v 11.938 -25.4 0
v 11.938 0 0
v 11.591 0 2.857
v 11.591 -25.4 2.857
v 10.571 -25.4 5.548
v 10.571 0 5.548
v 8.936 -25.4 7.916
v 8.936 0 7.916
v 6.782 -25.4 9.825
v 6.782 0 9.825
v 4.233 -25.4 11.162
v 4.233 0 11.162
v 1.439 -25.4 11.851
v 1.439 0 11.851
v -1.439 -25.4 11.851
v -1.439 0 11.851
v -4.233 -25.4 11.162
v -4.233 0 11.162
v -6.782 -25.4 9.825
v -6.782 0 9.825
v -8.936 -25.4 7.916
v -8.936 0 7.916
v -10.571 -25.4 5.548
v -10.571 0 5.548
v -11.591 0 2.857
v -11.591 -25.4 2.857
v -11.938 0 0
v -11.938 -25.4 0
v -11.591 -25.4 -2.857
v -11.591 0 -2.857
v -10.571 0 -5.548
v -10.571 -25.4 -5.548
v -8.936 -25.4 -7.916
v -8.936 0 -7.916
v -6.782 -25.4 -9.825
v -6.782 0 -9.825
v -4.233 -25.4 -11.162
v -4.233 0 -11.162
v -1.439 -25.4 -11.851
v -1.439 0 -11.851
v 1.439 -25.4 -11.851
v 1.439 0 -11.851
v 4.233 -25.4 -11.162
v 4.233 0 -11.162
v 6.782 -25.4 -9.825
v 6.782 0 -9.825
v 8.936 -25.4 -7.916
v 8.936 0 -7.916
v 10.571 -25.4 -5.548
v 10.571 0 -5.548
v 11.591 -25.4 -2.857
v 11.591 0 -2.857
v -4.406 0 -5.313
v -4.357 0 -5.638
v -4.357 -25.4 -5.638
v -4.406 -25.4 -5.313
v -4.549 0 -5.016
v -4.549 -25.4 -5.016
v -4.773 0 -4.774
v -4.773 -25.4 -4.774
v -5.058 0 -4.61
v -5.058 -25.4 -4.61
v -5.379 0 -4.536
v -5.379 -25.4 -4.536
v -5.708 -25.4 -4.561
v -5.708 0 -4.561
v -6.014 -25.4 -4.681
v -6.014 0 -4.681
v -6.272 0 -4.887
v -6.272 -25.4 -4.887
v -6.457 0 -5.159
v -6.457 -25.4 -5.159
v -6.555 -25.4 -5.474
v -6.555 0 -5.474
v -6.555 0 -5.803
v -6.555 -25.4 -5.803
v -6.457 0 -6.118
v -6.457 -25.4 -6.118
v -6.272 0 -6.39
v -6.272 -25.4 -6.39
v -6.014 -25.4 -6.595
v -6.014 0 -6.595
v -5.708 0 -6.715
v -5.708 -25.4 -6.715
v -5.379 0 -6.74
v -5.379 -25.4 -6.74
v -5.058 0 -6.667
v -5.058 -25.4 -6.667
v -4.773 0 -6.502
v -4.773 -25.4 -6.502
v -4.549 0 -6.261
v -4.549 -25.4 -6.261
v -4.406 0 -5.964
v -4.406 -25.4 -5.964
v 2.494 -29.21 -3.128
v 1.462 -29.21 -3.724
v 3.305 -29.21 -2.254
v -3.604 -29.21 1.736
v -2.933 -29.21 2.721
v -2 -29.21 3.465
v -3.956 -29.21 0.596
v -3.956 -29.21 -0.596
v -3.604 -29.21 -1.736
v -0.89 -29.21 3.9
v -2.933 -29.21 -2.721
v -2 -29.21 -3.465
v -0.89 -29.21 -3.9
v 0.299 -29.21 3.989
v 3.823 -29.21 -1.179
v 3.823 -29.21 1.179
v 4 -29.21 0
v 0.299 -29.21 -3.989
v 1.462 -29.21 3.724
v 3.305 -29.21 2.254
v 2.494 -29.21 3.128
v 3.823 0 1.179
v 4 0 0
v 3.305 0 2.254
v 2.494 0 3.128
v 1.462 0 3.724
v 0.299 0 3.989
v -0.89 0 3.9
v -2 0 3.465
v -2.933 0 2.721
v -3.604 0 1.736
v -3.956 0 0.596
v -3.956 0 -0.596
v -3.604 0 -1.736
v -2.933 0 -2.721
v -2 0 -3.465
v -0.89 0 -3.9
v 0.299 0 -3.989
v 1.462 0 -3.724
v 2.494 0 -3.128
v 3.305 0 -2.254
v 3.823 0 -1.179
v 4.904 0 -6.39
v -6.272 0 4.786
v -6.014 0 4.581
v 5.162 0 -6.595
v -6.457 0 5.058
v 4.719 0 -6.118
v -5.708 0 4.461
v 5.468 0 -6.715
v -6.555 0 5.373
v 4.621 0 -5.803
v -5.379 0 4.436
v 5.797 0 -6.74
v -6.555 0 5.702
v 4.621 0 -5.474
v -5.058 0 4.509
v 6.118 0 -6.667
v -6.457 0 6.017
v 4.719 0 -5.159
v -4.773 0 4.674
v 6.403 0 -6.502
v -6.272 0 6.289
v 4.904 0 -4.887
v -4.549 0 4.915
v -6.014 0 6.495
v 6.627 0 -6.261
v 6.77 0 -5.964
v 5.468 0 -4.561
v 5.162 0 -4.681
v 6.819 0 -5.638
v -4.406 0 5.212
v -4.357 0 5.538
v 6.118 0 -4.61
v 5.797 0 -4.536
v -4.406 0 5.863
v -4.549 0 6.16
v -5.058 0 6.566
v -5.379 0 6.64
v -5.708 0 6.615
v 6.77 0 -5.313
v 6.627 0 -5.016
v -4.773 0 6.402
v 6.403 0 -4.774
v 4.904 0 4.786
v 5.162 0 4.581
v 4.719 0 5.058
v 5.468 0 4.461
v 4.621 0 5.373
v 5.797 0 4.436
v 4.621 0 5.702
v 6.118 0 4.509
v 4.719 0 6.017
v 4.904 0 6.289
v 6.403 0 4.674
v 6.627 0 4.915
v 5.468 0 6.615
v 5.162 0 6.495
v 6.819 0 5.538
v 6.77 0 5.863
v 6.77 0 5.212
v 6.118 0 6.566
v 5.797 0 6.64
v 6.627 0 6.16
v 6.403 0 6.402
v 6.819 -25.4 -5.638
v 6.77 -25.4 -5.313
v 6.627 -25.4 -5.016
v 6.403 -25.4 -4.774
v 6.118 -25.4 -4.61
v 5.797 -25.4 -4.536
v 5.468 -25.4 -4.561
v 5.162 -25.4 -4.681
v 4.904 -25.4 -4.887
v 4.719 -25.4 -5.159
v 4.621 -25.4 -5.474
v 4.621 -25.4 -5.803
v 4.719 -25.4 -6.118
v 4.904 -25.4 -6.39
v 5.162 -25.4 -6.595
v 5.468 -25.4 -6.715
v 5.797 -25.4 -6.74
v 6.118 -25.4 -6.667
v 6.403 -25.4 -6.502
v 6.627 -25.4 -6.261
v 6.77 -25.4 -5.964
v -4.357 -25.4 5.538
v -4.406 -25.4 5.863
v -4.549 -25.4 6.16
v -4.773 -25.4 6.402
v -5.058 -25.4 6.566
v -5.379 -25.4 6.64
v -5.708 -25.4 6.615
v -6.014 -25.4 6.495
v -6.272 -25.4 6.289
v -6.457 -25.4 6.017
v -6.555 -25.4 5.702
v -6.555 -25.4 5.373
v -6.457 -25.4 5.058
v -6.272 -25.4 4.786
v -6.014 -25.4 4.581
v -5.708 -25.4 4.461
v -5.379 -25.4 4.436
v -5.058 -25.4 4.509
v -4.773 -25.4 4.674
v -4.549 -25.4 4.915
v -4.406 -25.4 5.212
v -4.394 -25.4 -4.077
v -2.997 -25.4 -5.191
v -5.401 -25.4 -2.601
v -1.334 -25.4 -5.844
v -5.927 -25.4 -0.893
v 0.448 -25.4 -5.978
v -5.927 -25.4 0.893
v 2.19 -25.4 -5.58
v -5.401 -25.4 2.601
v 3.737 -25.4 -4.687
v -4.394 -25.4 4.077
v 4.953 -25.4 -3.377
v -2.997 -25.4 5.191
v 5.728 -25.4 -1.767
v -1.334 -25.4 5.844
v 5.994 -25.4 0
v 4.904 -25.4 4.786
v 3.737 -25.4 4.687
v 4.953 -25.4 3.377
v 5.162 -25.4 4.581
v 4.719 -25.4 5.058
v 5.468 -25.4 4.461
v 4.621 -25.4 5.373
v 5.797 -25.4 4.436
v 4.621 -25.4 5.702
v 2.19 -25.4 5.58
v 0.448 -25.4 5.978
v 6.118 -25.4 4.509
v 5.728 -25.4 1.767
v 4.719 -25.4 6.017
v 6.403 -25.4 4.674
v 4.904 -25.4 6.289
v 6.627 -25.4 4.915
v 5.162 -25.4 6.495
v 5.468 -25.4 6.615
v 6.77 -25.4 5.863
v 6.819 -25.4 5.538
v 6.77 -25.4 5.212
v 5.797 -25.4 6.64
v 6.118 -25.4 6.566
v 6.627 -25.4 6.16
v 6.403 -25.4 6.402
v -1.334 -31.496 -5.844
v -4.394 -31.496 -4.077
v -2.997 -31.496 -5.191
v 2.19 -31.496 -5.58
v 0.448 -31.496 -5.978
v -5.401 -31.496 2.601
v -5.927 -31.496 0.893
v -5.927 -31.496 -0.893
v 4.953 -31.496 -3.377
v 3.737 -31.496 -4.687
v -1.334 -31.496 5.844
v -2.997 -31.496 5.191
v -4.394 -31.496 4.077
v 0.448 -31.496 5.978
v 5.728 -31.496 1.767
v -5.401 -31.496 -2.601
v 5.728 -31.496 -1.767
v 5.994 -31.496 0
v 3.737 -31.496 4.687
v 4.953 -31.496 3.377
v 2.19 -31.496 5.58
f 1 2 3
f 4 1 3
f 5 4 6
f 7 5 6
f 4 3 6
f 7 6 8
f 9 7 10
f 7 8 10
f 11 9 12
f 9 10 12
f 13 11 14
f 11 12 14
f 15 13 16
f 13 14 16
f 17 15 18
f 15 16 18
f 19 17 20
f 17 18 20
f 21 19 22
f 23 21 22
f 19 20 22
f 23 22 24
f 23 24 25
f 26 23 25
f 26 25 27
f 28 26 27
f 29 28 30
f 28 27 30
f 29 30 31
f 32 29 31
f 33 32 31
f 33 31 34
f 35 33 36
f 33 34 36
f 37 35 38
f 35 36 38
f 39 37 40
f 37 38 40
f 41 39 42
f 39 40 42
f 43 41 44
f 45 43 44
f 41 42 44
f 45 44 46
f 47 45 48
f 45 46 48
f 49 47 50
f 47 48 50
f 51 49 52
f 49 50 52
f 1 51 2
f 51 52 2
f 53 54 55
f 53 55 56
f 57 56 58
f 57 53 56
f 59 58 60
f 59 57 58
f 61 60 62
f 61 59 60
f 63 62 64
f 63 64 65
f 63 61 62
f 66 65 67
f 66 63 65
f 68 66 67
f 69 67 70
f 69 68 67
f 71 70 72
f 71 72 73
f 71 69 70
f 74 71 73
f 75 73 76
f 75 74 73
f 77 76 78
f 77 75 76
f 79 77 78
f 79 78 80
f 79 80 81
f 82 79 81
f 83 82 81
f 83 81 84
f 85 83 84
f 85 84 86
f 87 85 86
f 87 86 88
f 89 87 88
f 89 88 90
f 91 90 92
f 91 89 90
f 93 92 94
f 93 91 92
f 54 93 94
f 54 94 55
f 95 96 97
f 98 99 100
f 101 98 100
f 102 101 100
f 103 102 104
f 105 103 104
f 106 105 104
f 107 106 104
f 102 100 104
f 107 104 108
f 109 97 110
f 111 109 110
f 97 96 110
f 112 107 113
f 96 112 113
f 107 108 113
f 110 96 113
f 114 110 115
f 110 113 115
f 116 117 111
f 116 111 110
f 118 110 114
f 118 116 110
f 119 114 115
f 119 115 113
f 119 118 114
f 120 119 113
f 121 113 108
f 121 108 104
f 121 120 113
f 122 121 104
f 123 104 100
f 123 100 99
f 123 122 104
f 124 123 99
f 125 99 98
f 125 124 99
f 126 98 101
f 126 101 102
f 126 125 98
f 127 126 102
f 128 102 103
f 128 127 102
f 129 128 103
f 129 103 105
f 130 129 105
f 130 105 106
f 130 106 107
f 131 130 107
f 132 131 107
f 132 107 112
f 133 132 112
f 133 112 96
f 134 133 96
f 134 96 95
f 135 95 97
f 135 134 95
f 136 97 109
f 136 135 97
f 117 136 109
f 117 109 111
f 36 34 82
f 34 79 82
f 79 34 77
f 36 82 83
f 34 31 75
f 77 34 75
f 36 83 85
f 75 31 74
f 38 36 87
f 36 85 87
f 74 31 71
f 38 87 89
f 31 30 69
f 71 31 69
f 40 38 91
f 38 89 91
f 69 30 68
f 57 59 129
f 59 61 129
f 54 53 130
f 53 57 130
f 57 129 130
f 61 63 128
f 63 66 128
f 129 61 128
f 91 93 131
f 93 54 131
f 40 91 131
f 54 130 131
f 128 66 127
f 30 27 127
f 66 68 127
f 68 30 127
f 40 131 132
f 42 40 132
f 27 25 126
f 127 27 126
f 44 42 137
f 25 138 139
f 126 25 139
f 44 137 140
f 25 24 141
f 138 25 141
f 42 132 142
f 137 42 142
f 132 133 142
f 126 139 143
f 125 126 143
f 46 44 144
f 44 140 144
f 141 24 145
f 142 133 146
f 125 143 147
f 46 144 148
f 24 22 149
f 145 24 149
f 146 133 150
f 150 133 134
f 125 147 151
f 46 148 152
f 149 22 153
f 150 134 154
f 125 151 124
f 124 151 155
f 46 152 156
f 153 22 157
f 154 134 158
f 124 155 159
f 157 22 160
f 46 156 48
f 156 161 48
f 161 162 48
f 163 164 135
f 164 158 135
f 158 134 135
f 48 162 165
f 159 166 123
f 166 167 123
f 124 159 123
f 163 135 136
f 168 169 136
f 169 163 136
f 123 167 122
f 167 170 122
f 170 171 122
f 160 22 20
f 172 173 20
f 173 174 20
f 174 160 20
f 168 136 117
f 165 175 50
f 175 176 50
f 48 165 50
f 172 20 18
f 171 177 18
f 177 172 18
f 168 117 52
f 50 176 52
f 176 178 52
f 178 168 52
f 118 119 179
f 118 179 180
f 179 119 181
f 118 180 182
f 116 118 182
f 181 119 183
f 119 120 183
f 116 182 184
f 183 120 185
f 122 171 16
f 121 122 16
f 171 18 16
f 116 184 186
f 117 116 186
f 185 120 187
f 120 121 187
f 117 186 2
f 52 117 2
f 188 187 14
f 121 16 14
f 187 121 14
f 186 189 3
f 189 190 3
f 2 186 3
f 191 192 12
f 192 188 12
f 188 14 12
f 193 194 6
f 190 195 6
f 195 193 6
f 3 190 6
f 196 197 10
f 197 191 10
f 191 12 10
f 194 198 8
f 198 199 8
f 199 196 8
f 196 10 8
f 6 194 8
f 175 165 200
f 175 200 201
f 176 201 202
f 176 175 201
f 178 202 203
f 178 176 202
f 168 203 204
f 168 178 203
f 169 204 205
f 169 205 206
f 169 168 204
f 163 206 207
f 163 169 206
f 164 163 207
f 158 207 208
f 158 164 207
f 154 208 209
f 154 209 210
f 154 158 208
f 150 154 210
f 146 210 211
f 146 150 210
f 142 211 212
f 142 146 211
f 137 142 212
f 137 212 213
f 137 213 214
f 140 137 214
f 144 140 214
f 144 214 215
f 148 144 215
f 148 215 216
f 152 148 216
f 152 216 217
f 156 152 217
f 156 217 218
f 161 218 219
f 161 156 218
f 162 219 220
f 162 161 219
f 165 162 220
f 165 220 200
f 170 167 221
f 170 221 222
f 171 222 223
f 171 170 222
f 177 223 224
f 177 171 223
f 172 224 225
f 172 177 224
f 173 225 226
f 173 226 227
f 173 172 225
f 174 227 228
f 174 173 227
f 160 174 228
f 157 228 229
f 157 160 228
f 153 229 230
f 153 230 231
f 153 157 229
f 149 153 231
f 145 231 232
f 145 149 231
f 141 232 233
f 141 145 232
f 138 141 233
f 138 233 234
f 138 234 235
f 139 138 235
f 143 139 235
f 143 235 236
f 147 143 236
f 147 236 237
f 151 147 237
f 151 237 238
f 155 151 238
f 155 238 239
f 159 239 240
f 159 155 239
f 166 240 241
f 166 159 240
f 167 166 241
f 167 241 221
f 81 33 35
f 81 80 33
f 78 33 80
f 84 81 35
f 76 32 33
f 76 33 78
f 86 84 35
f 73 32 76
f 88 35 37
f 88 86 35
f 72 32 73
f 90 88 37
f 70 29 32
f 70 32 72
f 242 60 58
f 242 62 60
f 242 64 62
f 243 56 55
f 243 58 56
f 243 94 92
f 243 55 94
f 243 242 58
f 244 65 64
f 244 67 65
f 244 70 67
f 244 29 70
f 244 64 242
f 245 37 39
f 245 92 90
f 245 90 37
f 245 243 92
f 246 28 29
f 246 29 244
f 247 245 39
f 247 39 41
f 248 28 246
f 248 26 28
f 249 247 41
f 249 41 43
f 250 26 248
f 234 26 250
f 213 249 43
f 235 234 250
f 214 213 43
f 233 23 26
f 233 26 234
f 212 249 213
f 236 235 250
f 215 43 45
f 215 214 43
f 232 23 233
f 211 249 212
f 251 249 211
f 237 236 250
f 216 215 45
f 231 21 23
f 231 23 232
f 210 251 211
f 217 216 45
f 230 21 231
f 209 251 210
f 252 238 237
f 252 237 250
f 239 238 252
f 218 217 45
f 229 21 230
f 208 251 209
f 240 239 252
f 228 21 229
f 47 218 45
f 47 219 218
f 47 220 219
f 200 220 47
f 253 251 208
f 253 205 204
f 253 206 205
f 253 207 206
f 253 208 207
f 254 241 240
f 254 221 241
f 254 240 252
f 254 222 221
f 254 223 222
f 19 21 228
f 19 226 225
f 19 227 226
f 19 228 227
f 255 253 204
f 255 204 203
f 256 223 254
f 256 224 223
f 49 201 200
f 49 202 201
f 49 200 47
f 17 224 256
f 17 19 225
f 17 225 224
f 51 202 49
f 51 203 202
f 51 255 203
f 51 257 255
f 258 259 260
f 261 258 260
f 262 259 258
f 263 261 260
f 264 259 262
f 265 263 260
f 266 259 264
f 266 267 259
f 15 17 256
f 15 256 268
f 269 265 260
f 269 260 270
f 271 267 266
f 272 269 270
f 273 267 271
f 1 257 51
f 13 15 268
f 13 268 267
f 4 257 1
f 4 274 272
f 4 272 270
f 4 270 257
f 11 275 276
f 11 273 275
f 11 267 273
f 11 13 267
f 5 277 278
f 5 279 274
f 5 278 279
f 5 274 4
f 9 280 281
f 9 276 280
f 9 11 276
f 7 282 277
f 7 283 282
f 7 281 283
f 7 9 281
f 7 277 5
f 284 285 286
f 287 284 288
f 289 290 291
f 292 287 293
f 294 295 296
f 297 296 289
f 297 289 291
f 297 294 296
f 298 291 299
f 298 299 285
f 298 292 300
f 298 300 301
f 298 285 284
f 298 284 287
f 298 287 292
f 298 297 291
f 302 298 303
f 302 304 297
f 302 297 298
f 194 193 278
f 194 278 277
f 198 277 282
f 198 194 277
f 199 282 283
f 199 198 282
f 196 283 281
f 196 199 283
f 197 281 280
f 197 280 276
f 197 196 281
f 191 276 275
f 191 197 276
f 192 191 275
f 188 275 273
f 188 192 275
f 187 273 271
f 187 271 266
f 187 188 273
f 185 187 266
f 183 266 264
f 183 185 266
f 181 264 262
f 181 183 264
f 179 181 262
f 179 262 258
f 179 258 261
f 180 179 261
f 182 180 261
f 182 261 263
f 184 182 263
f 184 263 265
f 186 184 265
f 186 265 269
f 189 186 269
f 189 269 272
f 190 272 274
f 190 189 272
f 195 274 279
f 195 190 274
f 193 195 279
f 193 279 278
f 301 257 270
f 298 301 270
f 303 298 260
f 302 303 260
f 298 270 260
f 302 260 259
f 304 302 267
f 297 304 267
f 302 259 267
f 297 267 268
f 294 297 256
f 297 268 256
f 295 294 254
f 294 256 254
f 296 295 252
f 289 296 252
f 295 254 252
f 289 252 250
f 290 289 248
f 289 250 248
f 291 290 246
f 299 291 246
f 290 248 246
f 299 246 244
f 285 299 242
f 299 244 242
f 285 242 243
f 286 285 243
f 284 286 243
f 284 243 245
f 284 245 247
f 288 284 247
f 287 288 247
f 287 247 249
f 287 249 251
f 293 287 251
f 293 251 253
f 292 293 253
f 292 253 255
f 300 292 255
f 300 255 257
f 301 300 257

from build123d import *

# Parameters (mm, degrees)
F0_R     = 11.938
F0_R_2   = 1.1049
F0_R_3   = 5.9944
F1_DEPTH = 25.4
F0_R_4   = 4.0005
F2_DEPTH = 31.496
F3_DEPTH = 31.496
F4_R     = 4.0005
F5_DEPTH = 29.21


with BuildPart() as f1:
    # F0 (on Front) → F1 (new body)
    with BuildSketch(Plane.XZ):
        Circle(F0_R)
        with Locations((-5.461991, -5.638247)):
            Circle(F0_R_2, mode=Mode.SUBTRACT)
        with Locations((5.714009, -5.638247)):
            Circle(F0_R_2, mode=Mode.SUBTRACT)
        with Locations((-5.461991, 5.537753)):
            Circle(F0_R_2, mode=Mode.SUBTRACT)
        Circle(F0_R_3, mode=Mode.SUBTRACT)
        with Locations((5.714009, 5.537753)):
            Circle(F0_R_2, mode=Mode.SUBTRACT)
    extrude(amount=F1_DEPTH)

    # F0 (on Front) → F2 (join)
    with BuildSketch(Plane.XZ):
        Circle(F0_R_3)
        Circle(F0_R_4, mode=Mode.SUBTRACT)
    extrude(amount=F2_DEPTH)

    # F0 (on Front) → F3 (join)
    with BuildSketch(Plane.XZ):
        Circle(F0_R_4)
    extrude(amount=F3_DEPTH)

    # F4 (on face) + F0 (on Front) → F5 (cut)
    with BuildSketch(Plane.XZ):
        Circle(F4_R)
    with BuildSketch(Plane.XZ):
        Circle(F0_R_4)
    extrude(amount=F5_DEPTH, mode=Mode.SUBTRACT)


solid = f1.part
